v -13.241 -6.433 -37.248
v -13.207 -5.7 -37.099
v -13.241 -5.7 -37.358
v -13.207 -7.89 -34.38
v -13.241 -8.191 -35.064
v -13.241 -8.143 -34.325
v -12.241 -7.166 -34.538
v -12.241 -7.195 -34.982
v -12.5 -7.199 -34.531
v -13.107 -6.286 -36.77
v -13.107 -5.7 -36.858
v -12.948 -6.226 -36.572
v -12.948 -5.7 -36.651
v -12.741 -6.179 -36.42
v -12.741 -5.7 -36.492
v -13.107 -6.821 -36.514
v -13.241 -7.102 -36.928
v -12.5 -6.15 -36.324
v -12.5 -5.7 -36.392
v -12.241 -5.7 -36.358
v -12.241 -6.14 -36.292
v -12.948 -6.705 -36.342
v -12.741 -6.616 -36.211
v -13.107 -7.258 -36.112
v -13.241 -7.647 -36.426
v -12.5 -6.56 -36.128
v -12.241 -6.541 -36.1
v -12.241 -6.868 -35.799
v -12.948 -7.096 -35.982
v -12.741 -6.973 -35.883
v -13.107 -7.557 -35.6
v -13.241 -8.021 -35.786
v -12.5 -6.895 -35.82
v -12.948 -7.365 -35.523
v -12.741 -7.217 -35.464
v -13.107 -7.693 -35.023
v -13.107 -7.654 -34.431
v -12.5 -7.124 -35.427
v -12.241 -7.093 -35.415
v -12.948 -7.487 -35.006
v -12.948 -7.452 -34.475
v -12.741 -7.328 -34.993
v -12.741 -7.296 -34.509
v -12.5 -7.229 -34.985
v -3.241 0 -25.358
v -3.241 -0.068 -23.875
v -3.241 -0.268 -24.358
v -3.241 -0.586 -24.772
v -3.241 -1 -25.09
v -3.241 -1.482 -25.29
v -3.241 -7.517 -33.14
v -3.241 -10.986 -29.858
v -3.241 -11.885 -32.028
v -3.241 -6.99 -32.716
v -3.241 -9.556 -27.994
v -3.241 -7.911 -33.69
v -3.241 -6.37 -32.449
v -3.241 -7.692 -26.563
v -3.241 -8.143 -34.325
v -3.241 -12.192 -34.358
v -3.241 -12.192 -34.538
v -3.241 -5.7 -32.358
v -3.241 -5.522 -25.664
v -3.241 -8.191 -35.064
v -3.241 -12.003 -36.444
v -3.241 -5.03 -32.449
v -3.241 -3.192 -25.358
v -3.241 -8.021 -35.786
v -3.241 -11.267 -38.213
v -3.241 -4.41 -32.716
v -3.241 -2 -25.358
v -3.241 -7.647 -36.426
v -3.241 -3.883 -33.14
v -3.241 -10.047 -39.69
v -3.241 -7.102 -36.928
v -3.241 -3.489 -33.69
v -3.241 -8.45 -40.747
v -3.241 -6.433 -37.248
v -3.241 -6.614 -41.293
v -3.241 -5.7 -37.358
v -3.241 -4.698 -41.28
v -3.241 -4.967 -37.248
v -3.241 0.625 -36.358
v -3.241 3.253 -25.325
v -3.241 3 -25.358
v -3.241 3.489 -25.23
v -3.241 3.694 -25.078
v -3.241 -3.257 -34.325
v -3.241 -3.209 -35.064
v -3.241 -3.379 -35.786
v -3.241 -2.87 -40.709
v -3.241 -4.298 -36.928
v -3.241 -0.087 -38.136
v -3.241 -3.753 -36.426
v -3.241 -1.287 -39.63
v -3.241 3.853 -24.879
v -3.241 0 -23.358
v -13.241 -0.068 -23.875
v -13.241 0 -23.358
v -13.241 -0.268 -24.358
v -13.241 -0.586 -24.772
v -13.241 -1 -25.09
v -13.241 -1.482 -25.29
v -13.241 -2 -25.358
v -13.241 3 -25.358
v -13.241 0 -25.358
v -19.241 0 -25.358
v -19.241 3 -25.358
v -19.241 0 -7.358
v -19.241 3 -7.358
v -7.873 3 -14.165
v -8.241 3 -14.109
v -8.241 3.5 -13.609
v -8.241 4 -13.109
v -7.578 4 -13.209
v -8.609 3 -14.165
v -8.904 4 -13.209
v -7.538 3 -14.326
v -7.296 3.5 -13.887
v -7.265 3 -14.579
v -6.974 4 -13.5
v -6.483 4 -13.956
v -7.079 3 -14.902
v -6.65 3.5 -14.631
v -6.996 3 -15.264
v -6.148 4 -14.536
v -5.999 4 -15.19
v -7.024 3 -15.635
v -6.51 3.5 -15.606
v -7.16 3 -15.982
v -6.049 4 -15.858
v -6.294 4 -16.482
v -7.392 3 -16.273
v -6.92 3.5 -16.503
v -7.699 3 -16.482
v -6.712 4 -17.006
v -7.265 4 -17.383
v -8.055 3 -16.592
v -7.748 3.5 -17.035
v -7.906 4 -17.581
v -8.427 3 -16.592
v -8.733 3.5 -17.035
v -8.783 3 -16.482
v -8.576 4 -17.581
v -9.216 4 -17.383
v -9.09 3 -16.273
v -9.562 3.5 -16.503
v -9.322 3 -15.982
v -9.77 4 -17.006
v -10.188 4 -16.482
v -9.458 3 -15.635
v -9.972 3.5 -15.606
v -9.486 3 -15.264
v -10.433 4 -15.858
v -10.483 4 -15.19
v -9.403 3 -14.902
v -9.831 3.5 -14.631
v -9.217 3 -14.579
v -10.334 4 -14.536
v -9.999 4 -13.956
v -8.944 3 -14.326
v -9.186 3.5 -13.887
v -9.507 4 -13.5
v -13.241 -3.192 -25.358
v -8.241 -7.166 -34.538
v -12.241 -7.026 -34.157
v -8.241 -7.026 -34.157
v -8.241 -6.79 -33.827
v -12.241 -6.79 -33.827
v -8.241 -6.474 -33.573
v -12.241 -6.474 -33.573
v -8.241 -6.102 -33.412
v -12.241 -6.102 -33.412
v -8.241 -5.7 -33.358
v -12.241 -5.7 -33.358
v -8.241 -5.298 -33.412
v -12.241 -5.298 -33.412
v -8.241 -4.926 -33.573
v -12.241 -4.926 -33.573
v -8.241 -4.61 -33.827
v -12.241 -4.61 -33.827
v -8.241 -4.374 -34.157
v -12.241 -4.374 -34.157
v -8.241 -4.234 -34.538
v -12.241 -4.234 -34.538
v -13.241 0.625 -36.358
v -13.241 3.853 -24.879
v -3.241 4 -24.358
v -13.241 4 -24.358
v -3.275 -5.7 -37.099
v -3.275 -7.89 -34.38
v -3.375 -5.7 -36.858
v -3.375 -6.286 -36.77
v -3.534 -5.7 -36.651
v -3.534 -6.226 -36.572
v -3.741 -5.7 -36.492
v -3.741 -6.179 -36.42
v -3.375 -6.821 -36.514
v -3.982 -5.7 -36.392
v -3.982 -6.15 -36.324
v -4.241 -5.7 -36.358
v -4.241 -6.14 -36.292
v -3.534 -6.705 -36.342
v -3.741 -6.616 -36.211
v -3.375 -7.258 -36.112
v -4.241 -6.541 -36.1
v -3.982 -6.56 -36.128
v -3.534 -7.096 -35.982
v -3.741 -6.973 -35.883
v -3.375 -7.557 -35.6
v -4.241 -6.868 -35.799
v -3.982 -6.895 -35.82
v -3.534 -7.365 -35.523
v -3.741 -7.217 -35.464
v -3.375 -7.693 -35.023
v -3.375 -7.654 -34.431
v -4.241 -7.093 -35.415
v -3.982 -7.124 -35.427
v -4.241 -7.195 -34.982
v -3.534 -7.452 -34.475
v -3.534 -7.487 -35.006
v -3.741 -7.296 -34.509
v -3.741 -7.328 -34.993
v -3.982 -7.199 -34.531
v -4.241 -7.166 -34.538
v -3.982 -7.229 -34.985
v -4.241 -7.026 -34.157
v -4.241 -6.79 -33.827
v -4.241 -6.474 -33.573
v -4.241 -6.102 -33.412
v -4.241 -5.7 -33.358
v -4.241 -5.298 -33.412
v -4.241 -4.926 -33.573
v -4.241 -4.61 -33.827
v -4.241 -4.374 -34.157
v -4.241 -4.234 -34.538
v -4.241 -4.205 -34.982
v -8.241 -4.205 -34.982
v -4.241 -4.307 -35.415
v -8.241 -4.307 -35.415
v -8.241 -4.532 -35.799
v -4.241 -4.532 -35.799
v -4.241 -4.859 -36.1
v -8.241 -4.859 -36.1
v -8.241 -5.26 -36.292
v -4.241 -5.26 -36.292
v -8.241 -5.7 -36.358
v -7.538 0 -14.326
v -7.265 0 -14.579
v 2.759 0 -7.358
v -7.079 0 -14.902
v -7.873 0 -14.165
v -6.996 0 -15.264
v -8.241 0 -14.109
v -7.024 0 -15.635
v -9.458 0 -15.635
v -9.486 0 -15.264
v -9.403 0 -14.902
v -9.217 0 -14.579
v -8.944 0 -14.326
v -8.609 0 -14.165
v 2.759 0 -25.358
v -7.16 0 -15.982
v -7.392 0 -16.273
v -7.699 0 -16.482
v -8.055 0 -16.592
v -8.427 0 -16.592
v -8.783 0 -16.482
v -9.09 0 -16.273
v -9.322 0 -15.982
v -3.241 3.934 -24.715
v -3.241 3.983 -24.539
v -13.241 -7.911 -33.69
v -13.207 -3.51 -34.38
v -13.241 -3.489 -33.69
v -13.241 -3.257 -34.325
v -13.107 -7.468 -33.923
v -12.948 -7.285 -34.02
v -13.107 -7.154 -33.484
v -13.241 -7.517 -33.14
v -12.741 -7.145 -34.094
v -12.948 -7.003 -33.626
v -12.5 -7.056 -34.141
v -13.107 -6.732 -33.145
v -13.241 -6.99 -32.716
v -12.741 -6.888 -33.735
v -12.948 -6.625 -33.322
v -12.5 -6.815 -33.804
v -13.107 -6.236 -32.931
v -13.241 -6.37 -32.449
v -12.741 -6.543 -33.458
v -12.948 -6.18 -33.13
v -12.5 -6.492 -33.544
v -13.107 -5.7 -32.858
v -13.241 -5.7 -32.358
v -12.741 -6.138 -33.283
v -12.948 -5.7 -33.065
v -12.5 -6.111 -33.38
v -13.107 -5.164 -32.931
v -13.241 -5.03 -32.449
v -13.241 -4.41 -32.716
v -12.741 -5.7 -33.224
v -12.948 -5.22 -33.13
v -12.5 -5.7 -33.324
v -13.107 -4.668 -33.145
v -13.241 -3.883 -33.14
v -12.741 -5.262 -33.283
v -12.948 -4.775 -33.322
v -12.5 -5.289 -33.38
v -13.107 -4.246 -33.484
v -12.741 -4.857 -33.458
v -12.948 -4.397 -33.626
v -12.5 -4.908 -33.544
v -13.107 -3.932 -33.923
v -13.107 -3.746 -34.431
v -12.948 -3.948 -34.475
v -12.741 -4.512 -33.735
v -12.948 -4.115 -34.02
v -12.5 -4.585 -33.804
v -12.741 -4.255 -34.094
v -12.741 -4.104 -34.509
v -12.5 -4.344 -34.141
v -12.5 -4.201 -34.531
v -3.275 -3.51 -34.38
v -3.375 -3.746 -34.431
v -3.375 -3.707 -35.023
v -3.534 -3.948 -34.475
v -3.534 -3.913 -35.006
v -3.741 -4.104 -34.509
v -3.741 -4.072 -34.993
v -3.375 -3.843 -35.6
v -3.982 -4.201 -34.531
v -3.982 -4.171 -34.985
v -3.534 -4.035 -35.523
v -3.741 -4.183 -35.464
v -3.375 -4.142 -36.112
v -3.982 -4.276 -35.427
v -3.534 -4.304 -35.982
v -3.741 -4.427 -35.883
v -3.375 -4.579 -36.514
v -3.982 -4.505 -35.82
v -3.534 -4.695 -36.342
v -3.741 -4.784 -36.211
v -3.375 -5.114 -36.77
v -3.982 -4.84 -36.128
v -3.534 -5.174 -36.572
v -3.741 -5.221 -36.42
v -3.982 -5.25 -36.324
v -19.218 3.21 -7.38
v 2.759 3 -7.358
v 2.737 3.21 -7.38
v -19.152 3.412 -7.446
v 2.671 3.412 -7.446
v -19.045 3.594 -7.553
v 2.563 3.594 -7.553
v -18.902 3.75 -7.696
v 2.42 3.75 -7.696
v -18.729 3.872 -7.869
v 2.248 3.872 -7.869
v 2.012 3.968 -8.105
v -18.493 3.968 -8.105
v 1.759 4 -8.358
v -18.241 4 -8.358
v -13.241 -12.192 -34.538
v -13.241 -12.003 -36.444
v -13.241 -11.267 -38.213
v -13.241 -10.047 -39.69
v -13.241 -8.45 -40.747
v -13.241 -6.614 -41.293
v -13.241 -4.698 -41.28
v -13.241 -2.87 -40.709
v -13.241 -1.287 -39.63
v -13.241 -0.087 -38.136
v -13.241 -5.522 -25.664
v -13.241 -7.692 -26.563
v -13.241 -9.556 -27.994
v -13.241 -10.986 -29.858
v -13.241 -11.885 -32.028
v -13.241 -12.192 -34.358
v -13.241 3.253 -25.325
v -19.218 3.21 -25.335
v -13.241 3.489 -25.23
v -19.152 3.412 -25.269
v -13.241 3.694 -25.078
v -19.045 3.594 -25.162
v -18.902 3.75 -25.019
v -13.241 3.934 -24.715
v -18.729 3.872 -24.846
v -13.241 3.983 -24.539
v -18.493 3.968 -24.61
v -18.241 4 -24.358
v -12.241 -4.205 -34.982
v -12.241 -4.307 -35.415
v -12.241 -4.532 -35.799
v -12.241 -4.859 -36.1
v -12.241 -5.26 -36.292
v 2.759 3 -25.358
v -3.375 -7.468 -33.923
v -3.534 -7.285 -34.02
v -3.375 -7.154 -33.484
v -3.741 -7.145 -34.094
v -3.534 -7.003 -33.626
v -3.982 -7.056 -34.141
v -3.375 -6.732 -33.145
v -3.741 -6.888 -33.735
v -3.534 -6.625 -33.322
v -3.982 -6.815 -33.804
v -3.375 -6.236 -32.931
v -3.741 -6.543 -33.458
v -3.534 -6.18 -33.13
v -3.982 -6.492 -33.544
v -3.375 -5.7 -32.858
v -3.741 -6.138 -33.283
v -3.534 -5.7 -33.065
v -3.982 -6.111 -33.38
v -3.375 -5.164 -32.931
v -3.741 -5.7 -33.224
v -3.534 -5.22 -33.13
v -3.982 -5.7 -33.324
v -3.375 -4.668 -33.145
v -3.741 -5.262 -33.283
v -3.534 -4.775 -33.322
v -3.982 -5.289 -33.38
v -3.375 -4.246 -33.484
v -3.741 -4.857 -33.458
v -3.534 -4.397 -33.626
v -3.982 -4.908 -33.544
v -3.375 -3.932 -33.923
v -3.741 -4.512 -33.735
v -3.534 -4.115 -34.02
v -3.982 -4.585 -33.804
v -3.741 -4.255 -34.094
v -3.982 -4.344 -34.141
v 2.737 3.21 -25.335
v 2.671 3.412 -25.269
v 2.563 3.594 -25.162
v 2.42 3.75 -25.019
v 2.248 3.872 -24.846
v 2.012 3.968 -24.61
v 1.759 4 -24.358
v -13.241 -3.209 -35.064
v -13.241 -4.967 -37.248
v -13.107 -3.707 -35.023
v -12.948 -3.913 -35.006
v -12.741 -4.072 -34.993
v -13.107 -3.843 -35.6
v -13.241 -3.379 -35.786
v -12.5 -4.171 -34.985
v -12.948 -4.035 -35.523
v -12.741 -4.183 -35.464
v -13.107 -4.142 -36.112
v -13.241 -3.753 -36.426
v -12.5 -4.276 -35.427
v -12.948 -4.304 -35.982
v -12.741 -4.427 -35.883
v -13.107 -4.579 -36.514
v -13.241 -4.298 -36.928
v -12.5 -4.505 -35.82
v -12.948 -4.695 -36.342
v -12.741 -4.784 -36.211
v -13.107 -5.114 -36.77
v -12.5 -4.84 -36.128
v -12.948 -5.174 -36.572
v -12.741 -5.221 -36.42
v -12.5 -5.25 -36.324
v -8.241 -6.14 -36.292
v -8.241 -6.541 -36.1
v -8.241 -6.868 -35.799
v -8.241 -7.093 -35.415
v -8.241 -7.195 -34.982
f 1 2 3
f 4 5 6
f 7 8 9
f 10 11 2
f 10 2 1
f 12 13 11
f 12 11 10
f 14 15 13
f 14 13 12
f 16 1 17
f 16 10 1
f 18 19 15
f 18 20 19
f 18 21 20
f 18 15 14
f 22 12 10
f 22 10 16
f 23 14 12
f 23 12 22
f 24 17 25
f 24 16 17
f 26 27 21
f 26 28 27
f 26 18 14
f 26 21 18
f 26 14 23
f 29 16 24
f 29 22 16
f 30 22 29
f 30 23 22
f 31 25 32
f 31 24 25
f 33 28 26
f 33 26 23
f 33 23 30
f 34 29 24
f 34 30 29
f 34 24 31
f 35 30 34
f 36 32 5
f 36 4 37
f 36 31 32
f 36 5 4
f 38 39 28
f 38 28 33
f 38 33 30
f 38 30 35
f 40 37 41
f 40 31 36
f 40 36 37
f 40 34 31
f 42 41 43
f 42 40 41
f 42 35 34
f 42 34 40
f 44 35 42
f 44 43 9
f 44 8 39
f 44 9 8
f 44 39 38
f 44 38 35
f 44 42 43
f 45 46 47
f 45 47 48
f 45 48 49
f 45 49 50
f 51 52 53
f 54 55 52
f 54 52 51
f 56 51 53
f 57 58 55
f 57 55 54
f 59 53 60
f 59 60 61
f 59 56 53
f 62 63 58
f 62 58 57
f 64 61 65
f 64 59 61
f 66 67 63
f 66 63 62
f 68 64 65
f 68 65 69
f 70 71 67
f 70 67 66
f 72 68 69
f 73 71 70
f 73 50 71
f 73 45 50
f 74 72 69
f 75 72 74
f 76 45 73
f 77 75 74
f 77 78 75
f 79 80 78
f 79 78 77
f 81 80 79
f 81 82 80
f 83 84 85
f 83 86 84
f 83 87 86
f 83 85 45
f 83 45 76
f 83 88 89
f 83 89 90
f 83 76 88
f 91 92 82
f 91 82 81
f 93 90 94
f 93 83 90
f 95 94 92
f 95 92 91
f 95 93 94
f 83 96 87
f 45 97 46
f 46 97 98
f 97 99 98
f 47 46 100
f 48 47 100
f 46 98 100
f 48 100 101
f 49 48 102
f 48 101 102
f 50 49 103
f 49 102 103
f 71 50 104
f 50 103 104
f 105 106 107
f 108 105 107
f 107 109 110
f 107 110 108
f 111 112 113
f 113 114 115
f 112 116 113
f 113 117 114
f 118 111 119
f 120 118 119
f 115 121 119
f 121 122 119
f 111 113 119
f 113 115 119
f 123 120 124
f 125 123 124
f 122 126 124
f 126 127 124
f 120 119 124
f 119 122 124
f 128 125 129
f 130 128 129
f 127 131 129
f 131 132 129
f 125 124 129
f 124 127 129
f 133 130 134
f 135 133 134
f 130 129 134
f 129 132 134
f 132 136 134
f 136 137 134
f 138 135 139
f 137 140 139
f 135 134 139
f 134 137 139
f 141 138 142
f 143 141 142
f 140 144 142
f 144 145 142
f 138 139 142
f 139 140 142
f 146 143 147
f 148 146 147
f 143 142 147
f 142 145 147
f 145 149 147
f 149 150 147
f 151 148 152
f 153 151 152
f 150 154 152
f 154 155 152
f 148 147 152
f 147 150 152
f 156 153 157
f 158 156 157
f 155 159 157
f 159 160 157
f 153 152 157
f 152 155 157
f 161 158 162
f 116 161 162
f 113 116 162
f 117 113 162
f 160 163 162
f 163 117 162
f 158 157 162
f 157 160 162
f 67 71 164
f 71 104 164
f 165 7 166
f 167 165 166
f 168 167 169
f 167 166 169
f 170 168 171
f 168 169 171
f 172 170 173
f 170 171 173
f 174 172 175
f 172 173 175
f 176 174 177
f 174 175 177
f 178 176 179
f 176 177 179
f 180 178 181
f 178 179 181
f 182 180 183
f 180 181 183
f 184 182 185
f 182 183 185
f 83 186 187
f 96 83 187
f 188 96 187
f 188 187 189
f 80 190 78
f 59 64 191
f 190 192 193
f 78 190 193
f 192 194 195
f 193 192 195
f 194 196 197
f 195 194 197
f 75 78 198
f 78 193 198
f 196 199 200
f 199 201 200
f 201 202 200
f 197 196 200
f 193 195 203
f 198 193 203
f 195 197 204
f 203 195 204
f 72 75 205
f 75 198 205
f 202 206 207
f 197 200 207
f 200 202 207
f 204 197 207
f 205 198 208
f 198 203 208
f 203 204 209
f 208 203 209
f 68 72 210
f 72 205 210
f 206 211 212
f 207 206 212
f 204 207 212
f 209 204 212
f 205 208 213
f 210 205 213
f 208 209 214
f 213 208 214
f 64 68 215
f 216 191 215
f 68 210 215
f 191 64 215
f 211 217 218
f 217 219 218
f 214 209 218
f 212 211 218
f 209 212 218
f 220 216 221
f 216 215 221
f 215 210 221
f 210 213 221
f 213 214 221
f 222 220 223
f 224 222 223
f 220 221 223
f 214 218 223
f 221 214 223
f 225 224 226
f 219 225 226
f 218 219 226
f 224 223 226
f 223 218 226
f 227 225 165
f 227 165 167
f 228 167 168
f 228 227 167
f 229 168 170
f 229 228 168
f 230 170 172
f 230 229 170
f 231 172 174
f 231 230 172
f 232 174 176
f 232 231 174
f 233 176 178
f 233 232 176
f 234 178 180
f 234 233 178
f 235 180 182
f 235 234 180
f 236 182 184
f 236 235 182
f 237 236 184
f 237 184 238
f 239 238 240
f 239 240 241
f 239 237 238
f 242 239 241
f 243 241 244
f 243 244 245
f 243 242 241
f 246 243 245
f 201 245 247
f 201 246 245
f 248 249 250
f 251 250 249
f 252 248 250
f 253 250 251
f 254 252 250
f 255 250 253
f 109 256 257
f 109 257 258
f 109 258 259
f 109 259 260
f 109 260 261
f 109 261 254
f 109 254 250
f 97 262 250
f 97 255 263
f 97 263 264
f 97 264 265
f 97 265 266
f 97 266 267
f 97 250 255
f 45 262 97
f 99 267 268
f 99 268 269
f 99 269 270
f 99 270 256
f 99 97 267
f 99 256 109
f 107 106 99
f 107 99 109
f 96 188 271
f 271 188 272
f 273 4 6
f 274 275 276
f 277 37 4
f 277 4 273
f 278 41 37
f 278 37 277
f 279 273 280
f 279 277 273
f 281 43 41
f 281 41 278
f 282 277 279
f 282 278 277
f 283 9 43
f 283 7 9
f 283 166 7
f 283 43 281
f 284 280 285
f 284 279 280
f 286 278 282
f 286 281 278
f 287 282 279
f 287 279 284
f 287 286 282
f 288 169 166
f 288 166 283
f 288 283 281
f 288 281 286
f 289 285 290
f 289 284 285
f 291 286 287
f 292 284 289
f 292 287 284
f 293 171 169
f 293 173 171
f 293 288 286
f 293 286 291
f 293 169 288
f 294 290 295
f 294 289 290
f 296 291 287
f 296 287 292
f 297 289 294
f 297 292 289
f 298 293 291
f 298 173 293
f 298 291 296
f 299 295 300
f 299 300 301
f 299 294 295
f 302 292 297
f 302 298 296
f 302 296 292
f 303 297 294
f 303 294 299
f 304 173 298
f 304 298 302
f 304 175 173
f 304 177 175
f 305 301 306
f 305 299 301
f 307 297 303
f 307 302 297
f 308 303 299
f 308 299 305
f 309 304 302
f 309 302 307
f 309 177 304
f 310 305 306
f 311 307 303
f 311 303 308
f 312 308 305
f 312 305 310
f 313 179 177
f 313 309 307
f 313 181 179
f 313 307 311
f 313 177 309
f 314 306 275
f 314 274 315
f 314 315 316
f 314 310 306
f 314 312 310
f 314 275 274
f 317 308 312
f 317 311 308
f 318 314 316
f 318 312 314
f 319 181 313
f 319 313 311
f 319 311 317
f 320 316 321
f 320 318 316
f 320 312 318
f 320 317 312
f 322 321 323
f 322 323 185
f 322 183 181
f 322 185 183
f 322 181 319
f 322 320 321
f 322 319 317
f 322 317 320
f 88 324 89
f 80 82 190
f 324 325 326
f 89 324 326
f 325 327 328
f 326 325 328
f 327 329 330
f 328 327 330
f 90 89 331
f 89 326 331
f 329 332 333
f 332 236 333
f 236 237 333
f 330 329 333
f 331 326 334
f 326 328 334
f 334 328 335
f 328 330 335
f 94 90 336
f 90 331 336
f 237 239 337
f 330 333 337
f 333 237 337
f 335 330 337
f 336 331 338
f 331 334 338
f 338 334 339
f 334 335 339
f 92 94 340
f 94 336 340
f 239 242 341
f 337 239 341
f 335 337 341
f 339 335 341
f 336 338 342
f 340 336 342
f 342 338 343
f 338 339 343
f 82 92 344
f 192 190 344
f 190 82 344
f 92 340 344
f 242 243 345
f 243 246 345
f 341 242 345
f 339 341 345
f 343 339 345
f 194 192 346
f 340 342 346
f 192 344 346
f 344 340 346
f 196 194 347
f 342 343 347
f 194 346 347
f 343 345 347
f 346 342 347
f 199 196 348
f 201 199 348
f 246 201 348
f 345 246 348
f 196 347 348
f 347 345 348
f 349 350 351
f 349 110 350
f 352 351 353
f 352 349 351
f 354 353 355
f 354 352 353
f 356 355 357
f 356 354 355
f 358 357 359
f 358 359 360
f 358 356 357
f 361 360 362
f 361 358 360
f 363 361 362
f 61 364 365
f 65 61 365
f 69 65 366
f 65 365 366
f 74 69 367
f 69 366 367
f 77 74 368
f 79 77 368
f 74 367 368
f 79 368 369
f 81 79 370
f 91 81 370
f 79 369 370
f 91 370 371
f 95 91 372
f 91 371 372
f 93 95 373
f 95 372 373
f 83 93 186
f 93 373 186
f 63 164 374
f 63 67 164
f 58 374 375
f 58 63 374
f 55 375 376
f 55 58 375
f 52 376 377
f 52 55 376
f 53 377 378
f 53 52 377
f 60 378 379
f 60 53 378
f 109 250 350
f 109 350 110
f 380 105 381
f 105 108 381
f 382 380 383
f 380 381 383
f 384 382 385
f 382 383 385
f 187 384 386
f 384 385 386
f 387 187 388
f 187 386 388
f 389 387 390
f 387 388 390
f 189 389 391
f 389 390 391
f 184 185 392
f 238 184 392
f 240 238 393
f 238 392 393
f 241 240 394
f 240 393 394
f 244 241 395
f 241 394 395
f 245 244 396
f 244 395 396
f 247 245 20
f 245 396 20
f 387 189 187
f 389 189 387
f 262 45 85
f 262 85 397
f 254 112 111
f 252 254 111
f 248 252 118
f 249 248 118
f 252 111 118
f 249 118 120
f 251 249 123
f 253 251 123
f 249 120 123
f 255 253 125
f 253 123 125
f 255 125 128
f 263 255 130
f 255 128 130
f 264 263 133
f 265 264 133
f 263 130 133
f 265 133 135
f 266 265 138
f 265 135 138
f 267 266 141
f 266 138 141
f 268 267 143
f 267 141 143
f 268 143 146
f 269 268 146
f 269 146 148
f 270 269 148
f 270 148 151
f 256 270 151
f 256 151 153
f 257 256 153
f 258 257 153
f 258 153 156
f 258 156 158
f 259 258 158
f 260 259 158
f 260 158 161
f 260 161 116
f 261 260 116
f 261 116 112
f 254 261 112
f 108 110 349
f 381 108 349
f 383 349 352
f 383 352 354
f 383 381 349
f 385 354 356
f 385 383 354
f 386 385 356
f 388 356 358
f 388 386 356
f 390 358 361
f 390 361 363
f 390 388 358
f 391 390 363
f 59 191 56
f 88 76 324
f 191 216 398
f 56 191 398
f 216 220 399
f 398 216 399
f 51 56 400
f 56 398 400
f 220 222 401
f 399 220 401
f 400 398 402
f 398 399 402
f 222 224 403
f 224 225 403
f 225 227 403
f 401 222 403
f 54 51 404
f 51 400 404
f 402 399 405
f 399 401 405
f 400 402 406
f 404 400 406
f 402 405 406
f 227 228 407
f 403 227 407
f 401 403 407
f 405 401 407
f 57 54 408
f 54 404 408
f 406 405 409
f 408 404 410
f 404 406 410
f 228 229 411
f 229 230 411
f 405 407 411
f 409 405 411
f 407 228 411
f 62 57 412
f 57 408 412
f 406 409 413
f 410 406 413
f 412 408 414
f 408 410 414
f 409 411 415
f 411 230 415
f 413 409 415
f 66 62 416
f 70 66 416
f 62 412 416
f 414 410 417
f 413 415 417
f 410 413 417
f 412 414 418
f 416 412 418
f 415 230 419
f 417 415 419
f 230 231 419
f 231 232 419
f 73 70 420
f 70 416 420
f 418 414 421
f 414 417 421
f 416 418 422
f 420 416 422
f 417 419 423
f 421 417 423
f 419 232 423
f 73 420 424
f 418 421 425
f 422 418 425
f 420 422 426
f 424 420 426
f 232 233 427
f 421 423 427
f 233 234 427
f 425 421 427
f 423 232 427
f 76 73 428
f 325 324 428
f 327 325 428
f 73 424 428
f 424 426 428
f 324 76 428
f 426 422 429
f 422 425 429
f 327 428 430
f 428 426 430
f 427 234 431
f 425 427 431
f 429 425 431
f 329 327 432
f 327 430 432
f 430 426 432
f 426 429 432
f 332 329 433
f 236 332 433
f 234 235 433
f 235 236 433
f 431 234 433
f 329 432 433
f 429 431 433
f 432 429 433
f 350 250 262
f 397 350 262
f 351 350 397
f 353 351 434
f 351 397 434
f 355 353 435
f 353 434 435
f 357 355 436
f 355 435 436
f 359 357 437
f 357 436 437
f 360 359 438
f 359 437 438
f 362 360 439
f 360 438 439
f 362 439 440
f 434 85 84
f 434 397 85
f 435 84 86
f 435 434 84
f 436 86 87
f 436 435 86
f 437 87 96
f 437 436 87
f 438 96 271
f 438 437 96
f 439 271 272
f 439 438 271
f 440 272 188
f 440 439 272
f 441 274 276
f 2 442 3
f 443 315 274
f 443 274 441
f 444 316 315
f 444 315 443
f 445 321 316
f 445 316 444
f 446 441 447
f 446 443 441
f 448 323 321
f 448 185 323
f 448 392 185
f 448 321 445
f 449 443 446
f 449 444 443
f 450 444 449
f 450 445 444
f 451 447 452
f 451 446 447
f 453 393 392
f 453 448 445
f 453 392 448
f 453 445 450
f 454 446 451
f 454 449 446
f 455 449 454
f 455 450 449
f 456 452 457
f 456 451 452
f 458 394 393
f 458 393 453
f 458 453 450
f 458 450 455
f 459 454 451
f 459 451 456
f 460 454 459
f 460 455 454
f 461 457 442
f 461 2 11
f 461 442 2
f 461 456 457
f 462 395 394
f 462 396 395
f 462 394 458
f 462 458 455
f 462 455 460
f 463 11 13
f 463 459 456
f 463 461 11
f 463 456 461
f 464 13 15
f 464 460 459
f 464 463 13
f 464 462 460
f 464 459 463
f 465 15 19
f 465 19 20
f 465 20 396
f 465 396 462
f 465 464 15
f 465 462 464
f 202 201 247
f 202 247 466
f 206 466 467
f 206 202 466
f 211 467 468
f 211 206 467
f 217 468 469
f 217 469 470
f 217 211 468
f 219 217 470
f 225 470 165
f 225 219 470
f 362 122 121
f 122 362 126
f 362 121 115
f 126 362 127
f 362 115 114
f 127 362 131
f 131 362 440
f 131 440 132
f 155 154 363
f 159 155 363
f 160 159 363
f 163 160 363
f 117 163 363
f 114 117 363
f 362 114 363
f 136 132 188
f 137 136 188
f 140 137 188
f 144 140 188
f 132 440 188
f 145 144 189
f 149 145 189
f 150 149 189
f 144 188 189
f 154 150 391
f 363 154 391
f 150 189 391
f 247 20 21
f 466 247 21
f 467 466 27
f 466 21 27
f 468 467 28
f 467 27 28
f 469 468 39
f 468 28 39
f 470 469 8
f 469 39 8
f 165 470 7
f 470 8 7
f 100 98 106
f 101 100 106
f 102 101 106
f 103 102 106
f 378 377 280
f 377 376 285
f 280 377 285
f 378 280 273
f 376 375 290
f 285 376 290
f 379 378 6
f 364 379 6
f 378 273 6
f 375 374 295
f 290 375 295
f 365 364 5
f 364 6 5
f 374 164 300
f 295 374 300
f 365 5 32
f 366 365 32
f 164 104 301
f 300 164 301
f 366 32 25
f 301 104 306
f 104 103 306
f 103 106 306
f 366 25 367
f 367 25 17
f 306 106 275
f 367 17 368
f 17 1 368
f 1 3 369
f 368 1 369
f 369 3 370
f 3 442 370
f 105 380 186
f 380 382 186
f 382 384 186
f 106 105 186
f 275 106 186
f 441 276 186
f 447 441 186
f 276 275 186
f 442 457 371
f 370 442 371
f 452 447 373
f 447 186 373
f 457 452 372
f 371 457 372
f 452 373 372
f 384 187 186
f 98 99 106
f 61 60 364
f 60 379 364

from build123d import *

# Parameters (mm, degrees)
SKETCH1_W           = 11
SKETCH1_H           = 18
SKETCH1_W_2         = 5
SKETCH1_H_2         = 11
BOSS_EXTRUDE1_DEPTH = 4
BOSS_EXTRUDE2_DEPTH = 5
SKETCH3_R           = 1.248430758
CUT_EXTRUDE1_DEPTH  = 5
FILLET1_R           = 1
FILLET3_R           = 2
FILLET4_R           = 9
CUT_EXTRUDE2_DEPTH  = 10
CHAMFER2_SIZE       = 1


with BuildPart() as part:
    # Sketch1 → Boss-Extrude1 (new body)
    with BuildSketch(Plane(origin=(0, 0, 0), x_dir=(1, 0, 0), z_dir=(0, 1, 0))):
        with Locations((-2.740875912, 16.357664234)):
            Rectangle(SKETCH1_W, SKETCH1_H)
        with Locations((-5.740875912, 30.857664234)):
            Rectangle(SKETCH1_W_2, SKETCH1_H_2)
    boss_extrude1 = extrude(amount=BOSS_EXTRUDE1_DEPTH)

    # Sketch2 → Boss-Extrude2 (add)
    with BuildSketch(Plane(origin=(-3.240875912, 0, 0), x_dir=(0, 0, -1), z_dir=(1, 0, 0))):
        with BuildLine():
            Line((34.537911903, 0), (25.357664234, 0))
            Line((25.357664234, 0), (25.357664234, -12.192130501))
            Line((25.357664234, -12.192130501), (34.537911903, -12.192130501))
            Line((34.537911903, -12.192130501), (34.537911903, -7.165523267))
            ThreePointArc((34.537911903, -7.165523267), (33.357664234, -5.7), (34.537911903, -4.234476733))
            Line((34.537911903, -4.234476733), (34.537911903, 0))
        make_face()
        with BuildLine():
            Line((36.357664234, 0), (34.537911903, 0))
            Line((34.537911903, 0), (34.537911903, -4.234476733))
            ThreePointArc((34.537911903, -4.234476733), (35.798507341, -4.531747353), (36.357664234, -5.7))
            ThreePointArc((36.357664234, -5.7), (35.798507341, -6.868252647), (34.537911903, -7.165523267))
            Line((34.537911903, -7.165523267), (34.537911903, -12.192130501))
            ThreePointArc((34.537911903, -12.192130501), (41.293121094, -6.613725887), (36.357664234, 0.62455532))
            Line((36.357664234, 0.62455532), (36.357664234, 0))
        make_face()
    boss_extrude2 = extrude(amount=-BOSS_EXTRUDE2_DEPTH)

    # Mirror1: Boss-Extrude1, Boss-Extrude2 across plane
    add(boss_extrude1.mirror(Plane(origin=(-8.240875912, 4, 0), x_dir=(0, 0, 1), z_dir=(1, 0, 0))))
    add(boss_extrude2.mirror(Plane(origin=(-8.240875912, 4, 0), x_dir=(0, 0, 1), z_dir=(1, 0, 0))))

    # Sketch3 → Cut-Extrude1 (cut)
    with BuildSketch(Plane(origin=(0, 4, 0), x_dir=(1, 0, 0), z_dir=(0, 1, 0))):
        with Locations(Location((-8.240875912, 15.357664234, 0), (0, 0, 270))):
            Circle(SKETCH3_R)
    extrude(amount=-CUT_EXTRUDE1_DEPTH, mode=Mode.SUBTRACT)

    # Fillet1
    fillet1_edges = [part.edges().sort_by_distance(p)[0] for p in [
        (-0.240875912, 4, -25.357664234),
        (-3.240875912, -4.234476733, -35.177416564),
        (-8.240875912, 4, -7.357664234),
        (-19.240875912, 4, -16.357664234),
        (-16.240875912, 4, -25.357664234),
        (2.759124088, 4, -16.357664234),
        (-13.240875912, -4.234476733, -35.177416564),
    ]]
    fillet(fillet1_edges, radius=FILLET1_R)

    # Fillet3
    fillet3_edges = [part.edges().sort_by_distance(p)[0] for p in [
        (-8.240875912, 0, -25.357664234),
    ]]
    fillet(fillet3_edges, radius=FILLET3_R)

    # Fillet4
    fillet4_edges = [part.edges().sort_by_distance(p)[0] for p in [
        (-8.240875912, -12.192130501, -25.357664234),
    ]]
    fillet(fillet4_edges, radius=FILLET4_R)

    # Sketch4 → Cut-Extrude2 (cut)
    with BuildSketch(Plane.ZY.offset(13.240875912)):
        Polygon((-36.357664234, 0.62455532), (-24.357664234, 4), (-36.357664234, 4), align=None)
    extrude(amount=-CUT_EXTRUDE2_DEPTH, mode=Mode.SUBTRACT)

    # Chamfer2
    chamfer2_edges = [part.edges().sort_by_distance(p)[0] for p in [
        (-8.240875912, 4, -16.606094992),
    ]]
    chamfer(chamfer2_edges, length=CHAMFER2_SIZE)


solid = part.part
